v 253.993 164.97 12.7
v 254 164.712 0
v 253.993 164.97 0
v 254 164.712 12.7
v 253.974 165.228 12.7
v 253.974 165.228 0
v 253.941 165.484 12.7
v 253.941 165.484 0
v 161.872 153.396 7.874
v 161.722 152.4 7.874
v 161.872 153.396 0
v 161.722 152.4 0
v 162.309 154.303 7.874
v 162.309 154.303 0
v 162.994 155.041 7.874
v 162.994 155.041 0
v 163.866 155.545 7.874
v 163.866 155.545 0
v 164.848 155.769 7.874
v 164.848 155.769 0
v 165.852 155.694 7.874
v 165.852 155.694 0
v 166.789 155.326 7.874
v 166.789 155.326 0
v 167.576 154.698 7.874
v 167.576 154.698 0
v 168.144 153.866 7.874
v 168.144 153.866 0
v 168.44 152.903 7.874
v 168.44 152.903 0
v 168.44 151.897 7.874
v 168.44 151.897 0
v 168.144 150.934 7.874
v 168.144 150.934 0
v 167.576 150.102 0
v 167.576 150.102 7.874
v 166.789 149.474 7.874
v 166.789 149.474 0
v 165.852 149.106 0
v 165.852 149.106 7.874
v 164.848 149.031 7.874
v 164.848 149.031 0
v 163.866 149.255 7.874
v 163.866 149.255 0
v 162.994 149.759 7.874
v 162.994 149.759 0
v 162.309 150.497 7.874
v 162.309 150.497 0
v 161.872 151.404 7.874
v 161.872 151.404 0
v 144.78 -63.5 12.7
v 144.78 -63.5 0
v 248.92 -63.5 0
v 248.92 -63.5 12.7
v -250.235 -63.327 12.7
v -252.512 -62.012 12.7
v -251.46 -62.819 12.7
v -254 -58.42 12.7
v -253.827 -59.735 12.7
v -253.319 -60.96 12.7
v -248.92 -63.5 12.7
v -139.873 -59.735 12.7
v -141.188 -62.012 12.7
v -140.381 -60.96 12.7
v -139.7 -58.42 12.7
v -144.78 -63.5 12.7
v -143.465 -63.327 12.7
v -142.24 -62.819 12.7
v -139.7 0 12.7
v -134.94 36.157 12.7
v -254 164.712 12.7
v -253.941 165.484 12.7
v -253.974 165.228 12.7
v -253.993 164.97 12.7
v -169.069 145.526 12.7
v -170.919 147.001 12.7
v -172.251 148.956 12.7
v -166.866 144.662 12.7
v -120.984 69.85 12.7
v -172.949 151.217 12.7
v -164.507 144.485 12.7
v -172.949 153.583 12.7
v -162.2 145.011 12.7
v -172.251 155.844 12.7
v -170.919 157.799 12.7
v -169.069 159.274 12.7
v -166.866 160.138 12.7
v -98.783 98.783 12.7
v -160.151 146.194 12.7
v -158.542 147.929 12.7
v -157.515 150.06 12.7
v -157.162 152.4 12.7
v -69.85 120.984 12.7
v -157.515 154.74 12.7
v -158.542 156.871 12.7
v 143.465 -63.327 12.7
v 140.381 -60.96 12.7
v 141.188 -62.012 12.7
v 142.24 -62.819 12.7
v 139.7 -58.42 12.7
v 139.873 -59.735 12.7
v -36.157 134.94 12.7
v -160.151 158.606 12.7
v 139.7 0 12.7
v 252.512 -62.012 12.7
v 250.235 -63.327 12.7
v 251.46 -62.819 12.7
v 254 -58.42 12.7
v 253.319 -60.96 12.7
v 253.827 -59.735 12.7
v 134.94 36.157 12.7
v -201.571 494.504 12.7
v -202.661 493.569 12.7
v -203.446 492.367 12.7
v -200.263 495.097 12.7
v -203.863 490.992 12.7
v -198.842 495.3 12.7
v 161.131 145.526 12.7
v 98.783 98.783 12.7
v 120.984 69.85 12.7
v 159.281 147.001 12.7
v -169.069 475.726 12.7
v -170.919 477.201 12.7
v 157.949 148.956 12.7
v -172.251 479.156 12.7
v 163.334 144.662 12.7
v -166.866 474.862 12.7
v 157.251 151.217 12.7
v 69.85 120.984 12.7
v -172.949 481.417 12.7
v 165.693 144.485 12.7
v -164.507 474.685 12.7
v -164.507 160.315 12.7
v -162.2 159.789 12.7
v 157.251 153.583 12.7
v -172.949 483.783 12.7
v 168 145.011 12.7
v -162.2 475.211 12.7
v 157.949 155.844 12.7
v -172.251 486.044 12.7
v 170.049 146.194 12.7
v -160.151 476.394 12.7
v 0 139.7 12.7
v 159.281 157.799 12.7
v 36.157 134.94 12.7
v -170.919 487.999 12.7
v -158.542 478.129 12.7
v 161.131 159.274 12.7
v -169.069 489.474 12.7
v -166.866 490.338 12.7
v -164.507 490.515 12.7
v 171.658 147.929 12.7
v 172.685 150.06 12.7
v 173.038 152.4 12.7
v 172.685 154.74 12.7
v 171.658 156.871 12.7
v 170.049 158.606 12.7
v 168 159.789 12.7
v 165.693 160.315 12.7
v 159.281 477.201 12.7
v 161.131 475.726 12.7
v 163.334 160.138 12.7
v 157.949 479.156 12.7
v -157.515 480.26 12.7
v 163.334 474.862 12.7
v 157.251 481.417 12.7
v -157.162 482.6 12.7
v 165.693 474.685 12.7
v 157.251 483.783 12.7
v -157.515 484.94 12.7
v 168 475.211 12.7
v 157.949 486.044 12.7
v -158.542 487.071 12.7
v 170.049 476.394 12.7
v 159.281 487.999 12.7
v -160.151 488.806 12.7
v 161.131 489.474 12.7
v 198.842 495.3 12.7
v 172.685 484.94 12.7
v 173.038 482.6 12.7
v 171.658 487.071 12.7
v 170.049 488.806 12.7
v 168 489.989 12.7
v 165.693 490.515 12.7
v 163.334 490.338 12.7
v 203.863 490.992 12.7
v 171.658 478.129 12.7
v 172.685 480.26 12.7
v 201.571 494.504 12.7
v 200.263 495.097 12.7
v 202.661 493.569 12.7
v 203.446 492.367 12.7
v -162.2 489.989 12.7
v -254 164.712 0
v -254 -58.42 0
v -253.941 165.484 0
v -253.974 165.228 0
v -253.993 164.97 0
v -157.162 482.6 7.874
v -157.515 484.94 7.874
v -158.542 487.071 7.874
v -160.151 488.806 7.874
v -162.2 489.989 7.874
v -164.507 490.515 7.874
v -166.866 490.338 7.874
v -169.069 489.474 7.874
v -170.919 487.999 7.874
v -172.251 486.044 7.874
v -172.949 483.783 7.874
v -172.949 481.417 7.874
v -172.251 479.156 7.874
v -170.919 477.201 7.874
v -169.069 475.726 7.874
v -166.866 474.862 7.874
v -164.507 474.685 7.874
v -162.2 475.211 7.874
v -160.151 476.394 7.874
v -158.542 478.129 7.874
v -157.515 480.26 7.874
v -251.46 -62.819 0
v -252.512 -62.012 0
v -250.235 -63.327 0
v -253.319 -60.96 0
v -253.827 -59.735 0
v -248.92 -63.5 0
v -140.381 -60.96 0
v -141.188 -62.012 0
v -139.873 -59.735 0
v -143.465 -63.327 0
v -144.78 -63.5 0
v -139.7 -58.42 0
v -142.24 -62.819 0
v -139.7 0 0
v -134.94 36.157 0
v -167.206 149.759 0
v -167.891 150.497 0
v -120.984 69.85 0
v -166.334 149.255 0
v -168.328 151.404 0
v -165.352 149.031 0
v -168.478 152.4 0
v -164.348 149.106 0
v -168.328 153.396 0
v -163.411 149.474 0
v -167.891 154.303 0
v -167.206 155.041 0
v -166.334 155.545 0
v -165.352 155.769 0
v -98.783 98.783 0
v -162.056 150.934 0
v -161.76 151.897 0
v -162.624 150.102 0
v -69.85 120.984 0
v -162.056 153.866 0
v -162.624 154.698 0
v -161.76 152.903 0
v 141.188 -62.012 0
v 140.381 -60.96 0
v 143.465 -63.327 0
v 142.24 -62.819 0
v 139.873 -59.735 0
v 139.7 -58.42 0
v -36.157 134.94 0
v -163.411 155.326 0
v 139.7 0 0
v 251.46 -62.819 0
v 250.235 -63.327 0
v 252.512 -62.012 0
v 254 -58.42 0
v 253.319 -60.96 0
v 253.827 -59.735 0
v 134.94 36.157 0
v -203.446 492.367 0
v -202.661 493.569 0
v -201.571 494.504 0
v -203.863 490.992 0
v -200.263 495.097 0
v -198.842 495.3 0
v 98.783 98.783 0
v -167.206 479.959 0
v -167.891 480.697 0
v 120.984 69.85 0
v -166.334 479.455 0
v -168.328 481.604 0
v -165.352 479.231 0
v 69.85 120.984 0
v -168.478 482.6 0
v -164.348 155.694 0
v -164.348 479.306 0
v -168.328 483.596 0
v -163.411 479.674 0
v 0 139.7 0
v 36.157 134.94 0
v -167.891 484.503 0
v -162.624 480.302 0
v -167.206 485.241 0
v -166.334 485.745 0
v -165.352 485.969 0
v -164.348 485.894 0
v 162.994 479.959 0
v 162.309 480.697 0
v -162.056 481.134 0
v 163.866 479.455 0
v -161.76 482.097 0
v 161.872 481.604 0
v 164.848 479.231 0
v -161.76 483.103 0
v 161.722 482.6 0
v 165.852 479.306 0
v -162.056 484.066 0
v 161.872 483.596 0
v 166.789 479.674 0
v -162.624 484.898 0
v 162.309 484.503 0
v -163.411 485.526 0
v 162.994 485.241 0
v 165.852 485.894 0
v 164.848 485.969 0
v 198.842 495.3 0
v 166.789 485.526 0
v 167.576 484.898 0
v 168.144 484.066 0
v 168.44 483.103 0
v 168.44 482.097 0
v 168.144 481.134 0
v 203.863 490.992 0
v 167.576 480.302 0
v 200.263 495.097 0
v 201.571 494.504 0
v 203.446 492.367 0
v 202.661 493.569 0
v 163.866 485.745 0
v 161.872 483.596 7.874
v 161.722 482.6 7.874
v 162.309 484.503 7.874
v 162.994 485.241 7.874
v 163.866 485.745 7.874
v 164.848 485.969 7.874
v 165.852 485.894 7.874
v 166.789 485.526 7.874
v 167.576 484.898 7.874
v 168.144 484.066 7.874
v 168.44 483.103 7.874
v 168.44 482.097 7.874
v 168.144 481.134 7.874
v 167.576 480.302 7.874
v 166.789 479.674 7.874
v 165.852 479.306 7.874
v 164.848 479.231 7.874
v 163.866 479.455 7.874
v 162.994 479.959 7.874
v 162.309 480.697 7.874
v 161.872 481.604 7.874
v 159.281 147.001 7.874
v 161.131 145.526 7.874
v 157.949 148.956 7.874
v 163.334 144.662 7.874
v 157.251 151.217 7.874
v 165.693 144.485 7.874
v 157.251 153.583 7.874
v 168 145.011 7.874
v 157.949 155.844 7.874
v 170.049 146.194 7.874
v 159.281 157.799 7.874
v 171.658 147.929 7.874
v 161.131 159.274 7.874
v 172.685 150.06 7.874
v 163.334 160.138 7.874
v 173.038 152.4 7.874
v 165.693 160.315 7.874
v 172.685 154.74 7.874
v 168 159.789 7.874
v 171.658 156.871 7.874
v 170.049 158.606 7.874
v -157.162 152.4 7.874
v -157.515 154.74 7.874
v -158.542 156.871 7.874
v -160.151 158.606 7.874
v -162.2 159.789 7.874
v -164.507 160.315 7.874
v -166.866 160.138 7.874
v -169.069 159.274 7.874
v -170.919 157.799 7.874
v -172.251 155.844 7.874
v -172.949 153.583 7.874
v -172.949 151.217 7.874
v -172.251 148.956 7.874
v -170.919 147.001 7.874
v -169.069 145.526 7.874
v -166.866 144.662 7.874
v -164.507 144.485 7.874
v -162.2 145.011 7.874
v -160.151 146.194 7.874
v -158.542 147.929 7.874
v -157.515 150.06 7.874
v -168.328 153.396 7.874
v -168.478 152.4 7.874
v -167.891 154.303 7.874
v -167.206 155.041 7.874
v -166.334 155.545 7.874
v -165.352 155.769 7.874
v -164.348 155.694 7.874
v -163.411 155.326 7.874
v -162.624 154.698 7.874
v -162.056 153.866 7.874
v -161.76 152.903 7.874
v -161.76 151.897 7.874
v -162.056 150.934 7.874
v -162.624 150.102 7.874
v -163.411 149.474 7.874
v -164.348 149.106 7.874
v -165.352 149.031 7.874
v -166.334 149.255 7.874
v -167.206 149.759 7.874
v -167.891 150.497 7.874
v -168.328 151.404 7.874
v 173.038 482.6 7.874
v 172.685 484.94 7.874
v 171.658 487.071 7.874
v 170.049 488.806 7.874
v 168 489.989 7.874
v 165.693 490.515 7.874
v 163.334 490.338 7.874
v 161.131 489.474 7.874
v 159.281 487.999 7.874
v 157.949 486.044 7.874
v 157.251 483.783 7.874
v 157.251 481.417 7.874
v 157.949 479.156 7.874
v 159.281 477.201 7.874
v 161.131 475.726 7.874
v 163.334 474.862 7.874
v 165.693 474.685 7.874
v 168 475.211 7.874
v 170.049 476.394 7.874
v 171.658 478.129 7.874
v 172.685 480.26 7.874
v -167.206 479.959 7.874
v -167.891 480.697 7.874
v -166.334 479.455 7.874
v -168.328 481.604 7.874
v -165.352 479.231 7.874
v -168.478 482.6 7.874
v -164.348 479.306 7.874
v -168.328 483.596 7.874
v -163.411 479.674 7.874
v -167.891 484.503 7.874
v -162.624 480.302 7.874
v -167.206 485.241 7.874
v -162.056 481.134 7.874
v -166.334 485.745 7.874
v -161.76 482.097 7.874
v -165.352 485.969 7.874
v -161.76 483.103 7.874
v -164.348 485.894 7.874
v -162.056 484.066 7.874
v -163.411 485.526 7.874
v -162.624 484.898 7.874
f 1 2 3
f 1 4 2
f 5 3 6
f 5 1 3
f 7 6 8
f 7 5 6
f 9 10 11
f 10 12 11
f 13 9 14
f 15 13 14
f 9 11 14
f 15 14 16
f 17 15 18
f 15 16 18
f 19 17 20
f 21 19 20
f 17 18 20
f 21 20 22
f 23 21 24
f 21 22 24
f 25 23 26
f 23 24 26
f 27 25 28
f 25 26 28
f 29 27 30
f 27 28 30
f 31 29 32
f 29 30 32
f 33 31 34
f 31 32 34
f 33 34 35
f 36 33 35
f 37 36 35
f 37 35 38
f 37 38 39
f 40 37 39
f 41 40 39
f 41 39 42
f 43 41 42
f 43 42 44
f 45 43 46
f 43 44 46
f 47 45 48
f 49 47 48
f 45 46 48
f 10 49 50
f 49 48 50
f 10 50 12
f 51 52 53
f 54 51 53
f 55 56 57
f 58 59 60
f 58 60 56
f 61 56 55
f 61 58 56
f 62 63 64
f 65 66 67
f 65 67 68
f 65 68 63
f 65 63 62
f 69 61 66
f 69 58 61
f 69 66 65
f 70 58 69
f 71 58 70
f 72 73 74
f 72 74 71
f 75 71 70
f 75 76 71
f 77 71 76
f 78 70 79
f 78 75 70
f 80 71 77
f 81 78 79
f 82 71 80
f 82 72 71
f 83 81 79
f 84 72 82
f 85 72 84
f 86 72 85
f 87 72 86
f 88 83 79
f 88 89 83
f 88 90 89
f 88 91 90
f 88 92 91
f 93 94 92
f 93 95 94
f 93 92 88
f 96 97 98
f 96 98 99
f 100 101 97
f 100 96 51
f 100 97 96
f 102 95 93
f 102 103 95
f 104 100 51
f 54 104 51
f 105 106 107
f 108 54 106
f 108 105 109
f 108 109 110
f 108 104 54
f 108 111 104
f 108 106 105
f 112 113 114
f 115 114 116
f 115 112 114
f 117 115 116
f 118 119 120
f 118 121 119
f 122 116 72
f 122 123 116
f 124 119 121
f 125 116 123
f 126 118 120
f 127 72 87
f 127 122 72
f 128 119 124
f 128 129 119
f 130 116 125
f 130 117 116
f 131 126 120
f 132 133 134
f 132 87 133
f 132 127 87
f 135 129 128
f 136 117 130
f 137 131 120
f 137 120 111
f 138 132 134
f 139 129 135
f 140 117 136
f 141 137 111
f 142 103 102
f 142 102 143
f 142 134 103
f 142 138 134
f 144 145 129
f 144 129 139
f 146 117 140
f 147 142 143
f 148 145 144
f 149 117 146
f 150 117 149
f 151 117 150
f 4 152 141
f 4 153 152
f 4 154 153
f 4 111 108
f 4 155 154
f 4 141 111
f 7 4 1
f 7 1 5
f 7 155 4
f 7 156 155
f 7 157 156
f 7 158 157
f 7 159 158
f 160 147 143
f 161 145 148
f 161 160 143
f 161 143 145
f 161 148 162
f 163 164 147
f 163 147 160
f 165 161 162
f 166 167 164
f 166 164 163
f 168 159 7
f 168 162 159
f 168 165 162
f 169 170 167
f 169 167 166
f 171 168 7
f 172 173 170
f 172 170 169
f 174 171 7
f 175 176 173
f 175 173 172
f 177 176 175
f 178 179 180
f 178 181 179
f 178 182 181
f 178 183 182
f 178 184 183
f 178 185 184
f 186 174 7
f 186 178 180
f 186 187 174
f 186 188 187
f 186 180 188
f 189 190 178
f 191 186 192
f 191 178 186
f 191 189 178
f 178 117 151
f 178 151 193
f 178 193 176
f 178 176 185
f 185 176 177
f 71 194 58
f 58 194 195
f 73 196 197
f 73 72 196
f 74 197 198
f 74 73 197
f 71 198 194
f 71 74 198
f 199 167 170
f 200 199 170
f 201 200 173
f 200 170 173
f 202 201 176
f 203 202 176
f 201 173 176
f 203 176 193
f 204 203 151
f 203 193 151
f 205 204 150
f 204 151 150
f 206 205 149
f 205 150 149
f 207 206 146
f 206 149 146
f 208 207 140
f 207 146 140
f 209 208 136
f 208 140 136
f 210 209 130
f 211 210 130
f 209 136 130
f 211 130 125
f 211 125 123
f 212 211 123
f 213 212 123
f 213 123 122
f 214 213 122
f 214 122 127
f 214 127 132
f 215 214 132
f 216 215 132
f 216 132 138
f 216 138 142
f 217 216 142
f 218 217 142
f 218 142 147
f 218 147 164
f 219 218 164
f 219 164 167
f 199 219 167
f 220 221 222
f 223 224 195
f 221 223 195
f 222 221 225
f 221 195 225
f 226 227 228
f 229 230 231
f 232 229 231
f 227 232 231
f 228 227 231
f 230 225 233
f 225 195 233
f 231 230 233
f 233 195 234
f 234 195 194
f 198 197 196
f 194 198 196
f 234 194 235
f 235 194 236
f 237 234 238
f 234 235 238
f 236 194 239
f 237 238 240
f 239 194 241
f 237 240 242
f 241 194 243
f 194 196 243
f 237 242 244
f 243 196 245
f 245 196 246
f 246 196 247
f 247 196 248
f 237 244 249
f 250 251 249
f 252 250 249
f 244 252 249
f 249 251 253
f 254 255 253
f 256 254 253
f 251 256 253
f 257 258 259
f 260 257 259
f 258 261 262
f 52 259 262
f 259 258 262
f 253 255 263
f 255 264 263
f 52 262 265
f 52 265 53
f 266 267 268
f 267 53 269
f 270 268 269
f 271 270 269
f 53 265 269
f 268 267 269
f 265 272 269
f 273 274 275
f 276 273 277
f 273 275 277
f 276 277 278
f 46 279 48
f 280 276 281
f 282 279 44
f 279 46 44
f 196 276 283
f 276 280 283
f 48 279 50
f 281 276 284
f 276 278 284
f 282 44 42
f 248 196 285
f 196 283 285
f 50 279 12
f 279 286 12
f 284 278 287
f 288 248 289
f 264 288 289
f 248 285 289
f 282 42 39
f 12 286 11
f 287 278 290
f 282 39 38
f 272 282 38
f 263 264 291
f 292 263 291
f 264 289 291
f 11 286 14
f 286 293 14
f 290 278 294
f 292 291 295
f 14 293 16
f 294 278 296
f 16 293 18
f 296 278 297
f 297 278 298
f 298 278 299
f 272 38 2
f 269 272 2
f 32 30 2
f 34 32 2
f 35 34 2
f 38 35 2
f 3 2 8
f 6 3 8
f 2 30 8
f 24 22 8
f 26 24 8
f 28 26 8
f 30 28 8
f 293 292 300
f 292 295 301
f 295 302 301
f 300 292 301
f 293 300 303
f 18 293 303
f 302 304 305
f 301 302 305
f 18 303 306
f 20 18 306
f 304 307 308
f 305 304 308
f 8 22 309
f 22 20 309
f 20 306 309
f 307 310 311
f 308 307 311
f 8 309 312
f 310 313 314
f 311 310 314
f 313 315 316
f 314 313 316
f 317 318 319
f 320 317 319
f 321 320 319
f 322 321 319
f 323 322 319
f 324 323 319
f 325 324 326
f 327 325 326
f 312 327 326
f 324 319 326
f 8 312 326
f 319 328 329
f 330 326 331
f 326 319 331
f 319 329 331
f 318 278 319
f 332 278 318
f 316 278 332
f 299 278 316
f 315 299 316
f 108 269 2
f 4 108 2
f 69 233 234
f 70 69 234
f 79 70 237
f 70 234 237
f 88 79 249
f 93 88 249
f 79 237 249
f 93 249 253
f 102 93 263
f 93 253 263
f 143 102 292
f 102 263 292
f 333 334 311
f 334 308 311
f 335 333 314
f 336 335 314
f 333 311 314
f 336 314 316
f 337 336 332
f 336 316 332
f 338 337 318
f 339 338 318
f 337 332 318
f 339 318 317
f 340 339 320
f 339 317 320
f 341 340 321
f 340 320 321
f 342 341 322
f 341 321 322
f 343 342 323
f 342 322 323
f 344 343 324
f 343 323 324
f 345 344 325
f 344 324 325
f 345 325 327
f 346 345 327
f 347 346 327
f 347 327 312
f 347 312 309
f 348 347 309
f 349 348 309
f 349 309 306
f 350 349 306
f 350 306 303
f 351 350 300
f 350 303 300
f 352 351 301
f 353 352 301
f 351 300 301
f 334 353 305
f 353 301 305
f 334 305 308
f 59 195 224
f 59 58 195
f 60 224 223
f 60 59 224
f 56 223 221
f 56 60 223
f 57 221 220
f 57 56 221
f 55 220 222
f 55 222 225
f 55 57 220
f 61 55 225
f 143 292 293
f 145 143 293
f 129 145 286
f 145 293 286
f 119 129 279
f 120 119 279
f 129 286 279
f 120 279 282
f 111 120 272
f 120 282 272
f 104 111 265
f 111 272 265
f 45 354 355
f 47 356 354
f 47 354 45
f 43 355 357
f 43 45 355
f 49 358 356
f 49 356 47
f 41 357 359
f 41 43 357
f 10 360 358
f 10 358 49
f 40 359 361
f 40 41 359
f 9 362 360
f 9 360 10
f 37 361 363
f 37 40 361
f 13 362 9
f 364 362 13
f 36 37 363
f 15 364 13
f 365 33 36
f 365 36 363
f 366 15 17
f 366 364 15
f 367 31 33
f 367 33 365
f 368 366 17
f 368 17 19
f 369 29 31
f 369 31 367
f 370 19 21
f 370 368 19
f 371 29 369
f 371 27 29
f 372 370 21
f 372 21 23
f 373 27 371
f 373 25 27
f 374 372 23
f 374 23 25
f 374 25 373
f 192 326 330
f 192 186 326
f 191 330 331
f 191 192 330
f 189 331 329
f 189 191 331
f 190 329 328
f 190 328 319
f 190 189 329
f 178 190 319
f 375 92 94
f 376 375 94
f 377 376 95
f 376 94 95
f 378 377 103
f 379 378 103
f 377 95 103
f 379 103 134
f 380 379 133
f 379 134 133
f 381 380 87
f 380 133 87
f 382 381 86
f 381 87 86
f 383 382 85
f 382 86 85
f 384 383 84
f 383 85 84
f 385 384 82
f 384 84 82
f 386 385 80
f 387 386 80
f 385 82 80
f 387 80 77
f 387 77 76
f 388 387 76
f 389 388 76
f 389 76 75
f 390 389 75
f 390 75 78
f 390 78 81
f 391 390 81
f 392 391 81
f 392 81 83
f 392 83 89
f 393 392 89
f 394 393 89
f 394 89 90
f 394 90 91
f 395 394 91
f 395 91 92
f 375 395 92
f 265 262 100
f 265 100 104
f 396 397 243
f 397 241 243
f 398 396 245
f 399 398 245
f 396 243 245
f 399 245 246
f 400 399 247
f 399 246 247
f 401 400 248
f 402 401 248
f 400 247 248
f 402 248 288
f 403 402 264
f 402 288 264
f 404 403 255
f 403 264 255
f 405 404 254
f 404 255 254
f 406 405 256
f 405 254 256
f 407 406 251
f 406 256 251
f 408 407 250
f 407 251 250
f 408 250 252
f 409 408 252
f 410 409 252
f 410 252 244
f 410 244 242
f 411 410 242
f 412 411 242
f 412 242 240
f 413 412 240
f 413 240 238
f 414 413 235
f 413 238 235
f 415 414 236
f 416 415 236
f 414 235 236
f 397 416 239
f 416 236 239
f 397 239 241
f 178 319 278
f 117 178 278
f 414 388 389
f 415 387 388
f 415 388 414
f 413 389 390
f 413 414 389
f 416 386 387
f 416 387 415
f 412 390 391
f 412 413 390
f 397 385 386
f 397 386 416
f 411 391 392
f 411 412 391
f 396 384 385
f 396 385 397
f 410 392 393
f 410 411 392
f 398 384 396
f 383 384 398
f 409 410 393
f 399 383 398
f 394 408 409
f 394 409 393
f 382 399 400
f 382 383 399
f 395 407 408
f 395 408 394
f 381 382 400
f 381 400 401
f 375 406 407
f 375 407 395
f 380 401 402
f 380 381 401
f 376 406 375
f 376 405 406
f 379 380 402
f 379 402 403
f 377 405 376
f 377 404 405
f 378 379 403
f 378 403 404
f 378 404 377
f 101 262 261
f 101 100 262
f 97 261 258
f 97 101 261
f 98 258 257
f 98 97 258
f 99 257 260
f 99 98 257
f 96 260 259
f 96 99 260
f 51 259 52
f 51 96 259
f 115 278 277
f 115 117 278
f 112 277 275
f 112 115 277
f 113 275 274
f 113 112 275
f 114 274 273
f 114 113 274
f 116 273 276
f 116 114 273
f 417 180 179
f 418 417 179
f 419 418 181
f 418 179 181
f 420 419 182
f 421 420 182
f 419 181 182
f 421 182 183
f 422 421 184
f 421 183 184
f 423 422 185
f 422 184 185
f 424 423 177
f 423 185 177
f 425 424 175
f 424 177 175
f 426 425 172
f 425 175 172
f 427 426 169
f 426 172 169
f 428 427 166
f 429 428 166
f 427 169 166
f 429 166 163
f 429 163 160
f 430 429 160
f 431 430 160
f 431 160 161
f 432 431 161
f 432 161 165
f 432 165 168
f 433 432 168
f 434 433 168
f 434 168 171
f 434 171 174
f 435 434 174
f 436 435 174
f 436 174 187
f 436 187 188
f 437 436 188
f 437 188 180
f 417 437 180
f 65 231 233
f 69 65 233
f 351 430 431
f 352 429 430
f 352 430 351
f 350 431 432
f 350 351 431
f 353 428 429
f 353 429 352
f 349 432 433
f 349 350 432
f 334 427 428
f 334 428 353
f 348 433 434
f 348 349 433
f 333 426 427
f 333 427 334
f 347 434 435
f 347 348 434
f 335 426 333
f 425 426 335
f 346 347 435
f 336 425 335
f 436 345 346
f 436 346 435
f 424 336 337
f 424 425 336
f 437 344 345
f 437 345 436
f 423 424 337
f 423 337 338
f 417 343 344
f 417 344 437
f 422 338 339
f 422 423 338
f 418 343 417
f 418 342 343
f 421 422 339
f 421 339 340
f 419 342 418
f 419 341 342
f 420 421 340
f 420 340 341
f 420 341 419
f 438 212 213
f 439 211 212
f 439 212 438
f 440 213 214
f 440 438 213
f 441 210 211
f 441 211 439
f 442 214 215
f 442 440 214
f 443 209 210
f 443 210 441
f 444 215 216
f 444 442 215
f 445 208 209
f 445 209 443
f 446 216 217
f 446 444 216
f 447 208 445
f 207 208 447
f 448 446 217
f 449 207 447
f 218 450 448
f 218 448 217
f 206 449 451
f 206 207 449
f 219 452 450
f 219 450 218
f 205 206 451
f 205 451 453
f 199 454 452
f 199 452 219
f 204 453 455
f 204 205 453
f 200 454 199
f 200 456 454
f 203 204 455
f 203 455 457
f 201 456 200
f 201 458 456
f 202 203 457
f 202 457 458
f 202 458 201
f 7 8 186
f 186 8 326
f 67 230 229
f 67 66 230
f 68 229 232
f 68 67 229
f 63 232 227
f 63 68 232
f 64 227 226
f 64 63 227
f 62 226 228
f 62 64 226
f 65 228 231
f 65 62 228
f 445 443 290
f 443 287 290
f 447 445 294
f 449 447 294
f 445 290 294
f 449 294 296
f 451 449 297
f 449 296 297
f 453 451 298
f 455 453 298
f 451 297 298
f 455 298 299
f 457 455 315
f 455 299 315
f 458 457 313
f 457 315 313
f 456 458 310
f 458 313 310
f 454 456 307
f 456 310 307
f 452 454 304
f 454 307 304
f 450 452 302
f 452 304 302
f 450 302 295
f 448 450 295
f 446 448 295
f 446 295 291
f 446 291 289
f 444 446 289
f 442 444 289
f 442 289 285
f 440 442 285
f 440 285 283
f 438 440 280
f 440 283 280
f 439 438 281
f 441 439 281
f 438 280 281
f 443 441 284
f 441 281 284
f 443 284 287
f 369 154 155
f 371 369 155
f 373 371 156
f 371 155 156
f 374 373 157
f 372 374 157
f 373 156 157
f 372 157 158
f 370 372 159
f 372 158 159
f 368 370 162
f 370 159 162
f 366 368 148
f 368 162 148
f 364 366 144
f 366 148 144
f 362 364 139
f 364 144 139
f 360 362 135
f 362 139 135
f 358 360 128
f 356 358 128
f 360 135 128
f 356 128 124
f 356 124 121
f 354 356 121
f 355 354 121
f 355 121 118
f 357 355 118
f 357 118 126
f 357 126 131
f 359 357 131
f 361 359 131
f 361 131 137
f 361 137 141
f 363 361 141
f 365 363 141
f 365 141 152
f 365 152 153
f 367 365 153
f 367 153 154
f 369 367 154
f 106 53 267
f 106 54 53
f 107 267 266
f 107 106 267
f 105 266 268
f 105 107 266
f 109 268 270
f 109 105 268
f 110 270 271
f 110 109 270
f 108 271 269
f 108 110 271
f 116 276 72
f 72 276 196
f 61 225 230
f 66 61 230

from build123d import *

# Parameters (mm, degrees)
SKETCH1_W                                    = 114.3
SKETCH1_H                                    = 63.5
BOSS_EXTRUDE3_DEPTH                          = 12.7
FILLET1_R                                    = 5.08
CBORE_FOR_1_4_HEX_MACHINE_SCREW1_D           = 6.7564
CBORE_FOR_1_4_HEX_MACHINE_SCREW1_CBORE_D     = 15.875
CBORE_FOR_1_4_HEX_MACHINE_SCREW1_CBORE_DEPTH = 4.826


with BuildPart() as part:
    # Sketch1 → Boss-Extrude3 (new body)
    with BuildSketch(Plane.XY):
        with BuildLine():
            ThreePointArc((-139.7, 0), (-98.782817332, 98.782817332), (0, 139.7))
            Line((0, 139.7), (0, 495.3))
            Line((0, 495.3), (-203.2, 495.3))
            Line((-203.2, 495.3), (-254, 165.1))
            Line((-254, 165.1), (-254, 0))
            Line((-254, 0), (-139.7, 0))
        make_face()
        with Locations((-196.85, -31.75)):
            Rectangle(SKETCH1_W, SKETCH1_H)
        with BuildLine():
            ThreePointArc((0, 139.7), (98.782817332, 98.782817332), (139.7, 0))
            Line((139.7, 0), (254, 0))
            Line((254, 0), (254, 165.1))
            Line((254, 165.1), (203.2, 495.3))
            Line((203.2, 495.3), (0, 495.3))
            Line((0, 495.3), (0, 139.7))
        make_face()
        with Locations((196.85, -31.75)):
            Rectangle(SKETCH1_W, SKETCH1_H)
    extrude(amount=BOSS_EXTRUDE3_DEPTH)

    # Fillet1
    fillet1_edges = [part.edges().sort_by_distance(p)[0] for p in [
        (-139.7, -63.5, 6.35),
        (-254, -63.5, 6.35),
        (-254, 165.1, 6.35),
        (-203.2, 495.3, 6.35),
        (203.2, 495.3, 6.35),
        (254, 165.1, 6.35),
        (254, -63.5, 6.35),
        (139.7, -63.5, 6.35),
    ]]
    fillet(fillet1_edges, radius=FILLET1_R)

    # CBORE for 1/4 Hex Machine Screw1 (through all)
    with Locations(Plane.XY.offset(12.7)):
        with Locations((165.1, 482.6), (165.1, 152.4), (-165.1, 152.4), (-165.1, 482.6)):
            CounterBoreHole(CBORE_FOR_1_4_HEX_MACHINE_SCREW1_D / 2, CBORE_FOR_1_4_HEX_MACHINE_SCREW1_CBORE_D / 2, CBORE_FOR_1_4_HEX_MACHINE_SCREW1_CBORE_DEPTH)


solid = part.part
